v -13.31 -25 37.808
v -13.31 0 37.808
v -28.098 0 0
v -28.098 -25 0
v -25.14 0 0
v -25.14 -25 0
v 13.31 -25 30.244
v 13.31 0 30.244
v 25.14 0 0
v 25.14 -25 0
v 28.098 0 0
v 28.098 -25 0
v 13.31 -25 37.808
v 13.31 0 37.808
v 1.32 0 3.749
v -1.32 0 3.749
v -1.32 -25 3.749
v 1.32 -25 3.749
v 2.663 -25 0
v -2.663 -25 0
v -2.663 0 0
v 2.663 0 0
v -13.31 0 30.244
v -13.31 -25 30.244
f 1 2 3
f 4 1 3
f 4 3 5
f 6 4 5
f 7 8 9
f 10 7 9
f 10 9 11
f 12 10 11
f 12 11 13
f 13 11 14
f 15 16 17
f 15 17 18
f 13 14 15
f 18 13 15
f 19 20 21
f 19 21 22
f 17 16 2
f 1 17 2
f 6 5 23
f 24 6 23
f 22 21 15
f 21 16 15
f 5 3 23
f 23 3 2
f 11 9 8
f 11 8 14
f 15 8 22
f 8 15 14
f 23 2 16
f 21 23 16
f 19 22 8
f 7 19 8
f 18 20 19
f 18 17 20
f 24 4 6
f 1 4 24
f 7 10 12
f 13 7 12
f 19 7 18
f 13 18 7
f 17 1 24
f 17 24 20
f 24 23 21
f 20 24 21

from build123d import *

# Parameters (mm, degrees)
F1_DEPTH = 25
F2_W     = 5.325386
F2_H     = 3.749341
F3_DEPTH = 25


with BuildPart() as f1:
    # F0 (on Front) → F1 (new body)
    with BuildSketch(Plane.XZ):
        Polygon((-13.309799, 37.808198), (-28.098464, 0), (-25.139917, 0), (-13.309799, 30.244477), (-2.662693, 0), (0, 0), align=None)
        Polygon((13.309799, 37.808198), (0, 0), (2.662693, 0), (13.309799, 30.244477), (25.139917, 0), (28.098464, 0), align=None)
    extrude(amount=F1_DEPTH)

    # F2 (on face) → F3 (join)
    with BuildSketch(Plane.XZ.offset(25)):
        with Locations((0, 1.87467)):
            Rectangle(F2_W, F2_H)
    extrude(amount=-F3_DEPTH)


solid = f1.part
